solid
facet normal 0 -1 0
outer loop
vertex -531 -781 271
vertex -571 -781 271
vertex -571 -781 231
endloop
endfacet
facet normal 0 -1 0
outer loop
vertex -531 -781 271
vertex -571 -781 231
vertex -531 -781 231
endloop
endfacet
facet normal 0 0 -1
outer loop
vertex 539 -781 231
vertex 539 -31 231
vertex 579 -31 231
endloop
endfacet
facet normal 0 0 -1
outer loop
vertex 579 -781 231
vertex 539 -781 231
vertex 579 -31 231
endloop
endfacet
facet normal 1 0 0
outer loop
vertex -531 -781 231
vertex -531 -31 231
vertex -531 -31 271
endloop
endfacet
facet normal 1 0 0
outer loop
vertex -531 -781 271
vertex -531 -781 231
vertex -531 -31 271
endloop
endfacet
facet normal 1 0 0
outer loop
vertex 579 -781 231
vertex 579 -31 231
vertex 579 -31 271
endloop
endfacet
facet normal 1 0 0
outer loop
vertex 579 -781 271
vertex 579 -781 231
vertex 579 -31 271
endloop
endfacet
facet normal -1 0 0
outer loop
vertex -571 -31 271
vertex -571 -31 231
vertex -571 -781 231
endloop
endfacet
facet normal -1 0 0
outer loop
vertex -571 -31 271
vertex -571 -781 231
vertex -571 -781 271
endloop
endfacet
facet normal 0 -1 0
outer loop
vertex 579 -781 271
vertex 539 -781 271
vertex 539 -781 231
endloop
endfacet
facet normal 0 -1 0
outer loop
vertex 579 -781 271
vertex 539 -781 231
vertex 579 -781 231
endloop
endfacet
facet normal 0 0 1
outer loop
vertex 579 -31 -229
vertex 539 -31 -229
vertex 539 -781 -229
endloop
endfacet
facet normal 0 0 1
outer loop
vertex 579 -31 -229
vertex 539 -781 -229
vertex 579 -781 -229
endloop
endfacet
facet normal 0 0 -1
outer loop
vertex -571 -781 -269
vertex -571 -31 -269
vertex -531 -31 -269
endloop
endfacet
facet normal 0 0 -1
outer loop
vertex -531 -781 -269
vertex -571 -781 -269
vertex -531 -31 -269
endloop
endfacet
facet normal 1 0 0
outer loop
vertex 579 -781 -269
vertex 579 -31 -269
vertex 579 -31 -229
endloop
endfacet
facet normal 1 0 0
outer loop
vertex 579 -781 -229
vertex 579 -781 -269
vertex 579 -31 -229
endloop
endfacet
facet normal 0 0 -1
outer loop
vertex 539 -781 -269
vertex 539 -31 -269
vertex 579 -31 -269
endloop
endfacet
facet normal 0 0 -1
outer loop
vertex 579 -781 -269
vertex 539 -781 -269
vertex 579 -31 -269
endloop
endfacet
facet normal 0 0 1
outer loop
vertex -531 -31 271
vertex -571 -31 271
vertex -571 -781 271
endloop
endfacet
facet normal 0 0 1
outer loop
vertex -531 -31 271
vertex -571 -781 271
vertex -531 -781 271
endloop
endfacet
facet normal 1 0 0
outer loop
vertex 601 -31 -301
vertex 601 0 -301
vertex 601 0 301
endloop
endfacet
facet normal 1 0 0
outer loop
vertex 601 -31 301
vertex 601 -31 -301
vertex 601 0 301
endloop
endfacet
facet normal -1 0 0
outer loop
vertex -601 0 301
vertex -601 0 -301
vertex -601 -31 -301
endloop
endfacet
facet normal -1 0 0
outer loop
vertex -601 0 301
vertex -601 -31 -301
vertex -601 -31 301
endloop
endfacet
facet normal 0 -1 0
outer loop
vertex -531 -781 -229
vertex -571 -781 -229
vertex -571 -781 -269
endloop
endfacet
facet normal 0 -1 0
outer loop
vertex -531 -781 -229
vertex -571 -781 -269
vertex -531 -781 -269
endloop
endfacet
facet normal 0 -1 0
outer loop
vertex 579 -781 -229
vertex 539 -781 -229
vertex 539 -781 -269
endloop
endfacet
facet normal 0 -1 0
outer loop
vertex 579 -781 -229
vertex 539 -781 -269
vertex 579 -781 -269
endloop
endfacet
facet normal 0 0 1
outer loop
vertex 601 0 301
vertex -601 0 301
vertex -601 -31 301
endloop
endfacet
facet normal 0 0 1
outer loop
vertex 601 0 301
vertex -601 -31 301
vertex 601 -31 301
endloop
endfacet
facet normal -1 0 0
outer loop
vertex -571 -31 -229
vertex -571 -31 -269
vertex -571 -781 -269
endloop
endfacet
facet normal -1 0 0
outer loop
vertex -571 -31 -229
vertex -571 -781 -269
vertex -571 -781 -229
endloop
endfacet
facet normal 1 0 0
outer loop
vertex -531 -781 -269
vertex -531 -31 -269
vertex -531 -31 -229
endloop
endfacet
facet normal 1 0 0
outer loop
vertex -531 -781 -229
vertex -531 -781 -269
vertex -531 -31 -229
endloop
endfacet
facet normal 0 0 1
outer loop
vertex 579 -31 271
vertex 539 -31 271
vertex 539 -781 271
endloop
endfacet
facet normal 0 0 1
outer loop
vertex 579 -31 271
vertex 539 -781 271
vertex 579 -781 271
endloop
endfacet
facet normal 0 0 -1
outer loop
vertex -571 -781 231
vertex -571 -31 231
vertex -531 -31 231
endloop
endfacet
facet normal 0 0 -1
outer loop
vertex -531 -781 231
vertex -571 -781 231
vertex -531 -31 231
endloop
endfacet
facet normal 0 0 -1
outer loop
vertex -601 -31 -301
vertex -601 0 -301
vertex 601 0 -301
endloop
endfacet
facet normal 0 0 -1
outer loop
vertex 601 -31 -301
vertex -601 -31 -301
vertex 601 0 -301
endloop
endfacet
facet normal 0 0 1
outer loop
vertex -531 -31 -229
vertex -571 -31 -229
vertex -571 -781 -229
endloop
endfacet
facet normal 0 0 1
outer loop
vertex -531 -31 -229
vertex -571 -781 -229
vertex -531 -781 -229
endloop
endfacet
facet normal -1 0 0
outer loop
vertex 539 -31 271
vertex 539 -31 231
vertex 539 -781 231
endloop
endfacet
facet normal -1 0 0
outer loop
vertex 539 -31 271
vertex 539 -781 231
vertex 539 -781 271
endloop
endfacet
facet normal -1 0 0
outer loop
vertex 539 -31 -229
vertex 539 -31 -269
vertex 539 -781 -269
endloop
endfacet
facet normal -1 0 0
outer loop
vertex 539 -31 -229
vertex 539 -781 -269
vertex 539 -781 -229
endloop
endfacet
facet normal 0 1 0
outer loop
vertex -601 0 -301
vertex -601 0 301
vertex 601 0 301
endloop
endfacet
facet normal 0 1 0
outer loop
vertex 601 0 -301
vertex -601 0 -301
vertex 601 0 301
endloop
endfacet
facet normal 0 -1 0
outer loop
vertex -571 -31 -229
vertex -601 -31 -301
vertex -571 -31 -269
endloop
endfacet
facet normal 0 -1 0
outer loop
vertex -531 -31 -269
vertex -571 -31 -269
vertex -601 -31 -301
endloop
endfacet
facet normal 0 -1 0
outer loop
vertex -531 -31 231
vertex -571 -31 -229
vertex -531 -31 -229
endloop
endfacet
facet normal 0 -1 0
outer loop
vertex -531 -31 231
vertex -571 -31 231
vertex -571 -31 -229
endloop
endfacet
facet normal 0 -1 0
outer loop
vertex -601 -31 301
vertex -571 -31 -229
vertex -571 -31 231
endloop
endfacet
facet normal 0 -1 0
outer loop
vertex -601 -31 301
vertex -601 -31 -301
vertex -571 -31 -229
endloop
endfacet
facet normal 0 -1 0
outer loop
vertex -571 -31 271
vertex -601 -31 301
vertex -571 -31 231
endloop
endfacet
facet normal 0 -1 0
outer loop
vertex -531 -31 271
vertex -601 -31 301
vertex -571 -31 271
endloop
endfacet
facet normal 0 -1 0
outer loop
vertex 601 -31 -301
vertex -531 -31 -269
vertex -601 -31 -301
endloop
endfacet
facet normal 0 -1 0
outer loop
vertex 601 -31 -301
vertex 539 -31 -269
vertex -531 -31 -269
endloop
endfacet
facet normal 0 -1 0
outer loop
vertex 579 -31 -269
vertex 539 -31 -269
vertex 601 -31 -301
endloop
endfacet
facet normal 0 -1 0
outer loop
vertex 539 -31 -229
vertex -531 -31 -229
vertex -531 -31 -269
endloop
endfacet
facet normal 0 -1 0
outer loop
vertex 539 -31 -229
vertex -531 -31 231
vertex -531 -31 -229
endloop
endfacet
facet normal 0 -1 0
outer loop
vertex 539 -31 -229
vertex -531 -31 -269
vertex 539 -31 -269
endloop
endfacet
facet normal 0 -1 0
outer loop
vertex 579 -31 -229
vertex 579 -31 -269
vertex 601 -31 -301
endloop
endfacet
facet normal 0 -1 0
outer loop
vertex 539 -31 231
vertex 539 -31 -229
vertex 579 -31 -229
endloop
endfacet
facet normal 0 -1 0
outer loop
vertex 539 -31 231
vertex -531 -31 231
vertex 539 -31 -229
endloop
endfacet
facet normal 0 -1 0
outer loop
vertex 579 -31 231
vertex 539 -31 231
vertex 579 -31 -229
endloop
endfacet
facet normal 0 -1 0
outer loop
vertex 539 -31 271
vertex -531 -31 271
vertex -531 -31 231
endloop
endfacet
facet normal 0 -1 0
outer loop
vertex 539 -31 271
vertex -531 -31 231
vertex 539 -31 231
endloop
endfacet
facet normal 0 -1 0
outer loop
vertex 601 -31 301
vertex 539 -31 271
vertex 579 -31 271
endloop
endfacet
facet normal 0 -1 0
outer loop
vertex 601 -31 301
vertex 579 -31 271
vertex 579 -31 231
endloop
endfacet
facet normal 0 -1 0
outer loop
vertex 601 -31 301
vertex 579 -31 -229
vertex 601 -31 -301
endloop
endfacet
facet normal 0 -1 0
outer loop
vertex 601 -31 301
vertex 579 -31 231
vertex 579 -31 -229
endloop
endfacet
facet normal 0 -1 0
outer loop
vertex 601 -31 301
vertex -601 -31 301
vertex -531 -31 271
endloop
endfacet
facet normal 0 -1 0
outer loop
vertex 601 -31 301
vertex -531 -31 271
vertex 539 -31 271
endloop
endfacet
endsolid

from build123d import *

# Parameters (mm, degrees)
CORTAR_EXTRUIR1_START      = -50
CROQUIS2_R                 = 4.324629937
CORTAR_EXTRUIR1_DEPTH      = 25
CROQUIS3_W                 = 1202
CROQUIS3_H                 = 602
SALIENTE_EXTRUIR1_DEPTH    = 31
CROQUIS4_W                 = 40
CROQUIS4_H                 = 40
SALIENTE_EXTRUIR2_DEPTH    = 750
CORTAR_EXTRUIR2_DEPTH      = 1031.418846877
CORTAR_EXTRUIR2_DEPTH_BACK = 1031.418846877
CROQUIS5_W                 = 169.23973075
CROQUIS5_H                 = 94.141610947


with BuildPart() as part:
    # Croquis1 → Revolución1 (revolve)
    with BuildSketch(Plane.XY, mode=Mode.PRIVATE) as revoluci_n1_sk:
        Polygon((0, 0), (0, 80), (-58, 80), (-58, 31.455108359), (-67.5, 0), align=None)
    revolve(revoluci_n1_sk.sketch.rotate(Axis((0, 0, 0), (0, 1, 0)), 180), axis=Axis((0, 0, 0), (0, 1, 0)))

    # Croquis2 → Cortar-Extruir1 (cut)
    with BuildSketch(Plane(origin=(0, 80, 0), x_dir=(1, 0, 0), z_dir=(0, 1, 0)).offset(CORTAR_EXTRUIR1_START)):
        with Locations((0, 63.025248345)):
            Circle(CROQUIS2_R)
        with Locations((63.025248345, 0)):
            Circle(CROQUIS2_R)
        with Locations((0, -63.025248345)):
            Circle(CROQUIS2_R)
        with Locations((-63.025248345, 0)):
            Circle(CROQUIS2_R)
    extrude(amount=-CORTAR_EXTRUIR1_DEPTH, mode=Mode.SUBTRACT)

    # Croquis3 → Saliente-Extruir1 (add)
    with BuildSketch(Plane.XZ):
        Rectangle(CROQUIS3_W, CROQUIS3_H)
    extrude(amount=SALIENTE_EXTRUIR1_DEPTH)

    # Croquis4 → Saliente-Extruir2 (add)
    with BuildSketch(Plane.XZ.offset(31)):
        with Locations((-551, 251)):
            Rectangle(CROQUIS4_W, CROQUIS4_H)
        with Locations((559, 251)):
            Rectangle(CROQUIS4_W, CROQUIS4_H)
        with Locations((559, -249)):
            Rectangle(CROQUIS4_W, CROQUIS4_H)
        with Locations((-551, -249)):
            Rectangle(CROQUIS4_W, CROQUIS4_H)
    extrude(amount=SALIENTE_EXTRUIR2_DEPTH)

    # Croquis5 → Cortar-Extruir2 (cut, two sides: drawn at the far end of the back side and taken through both)
    with BuildSketch(Plane.XY.offset(-CORTAR_EXTRUIR2_DEPTH_BACK)):
        with Locations((-9.450479153, 47.070805474)):
            Rectangle(CROQUIS5_W, CROQUIS5_H)
    extrude(amount=CORTAR_EXTRUIR2_DEPTH + CORTAR_EXTRUIR2_DEPTH_BACK, mode=Mode.SUBTRACT)


solid = part.part
